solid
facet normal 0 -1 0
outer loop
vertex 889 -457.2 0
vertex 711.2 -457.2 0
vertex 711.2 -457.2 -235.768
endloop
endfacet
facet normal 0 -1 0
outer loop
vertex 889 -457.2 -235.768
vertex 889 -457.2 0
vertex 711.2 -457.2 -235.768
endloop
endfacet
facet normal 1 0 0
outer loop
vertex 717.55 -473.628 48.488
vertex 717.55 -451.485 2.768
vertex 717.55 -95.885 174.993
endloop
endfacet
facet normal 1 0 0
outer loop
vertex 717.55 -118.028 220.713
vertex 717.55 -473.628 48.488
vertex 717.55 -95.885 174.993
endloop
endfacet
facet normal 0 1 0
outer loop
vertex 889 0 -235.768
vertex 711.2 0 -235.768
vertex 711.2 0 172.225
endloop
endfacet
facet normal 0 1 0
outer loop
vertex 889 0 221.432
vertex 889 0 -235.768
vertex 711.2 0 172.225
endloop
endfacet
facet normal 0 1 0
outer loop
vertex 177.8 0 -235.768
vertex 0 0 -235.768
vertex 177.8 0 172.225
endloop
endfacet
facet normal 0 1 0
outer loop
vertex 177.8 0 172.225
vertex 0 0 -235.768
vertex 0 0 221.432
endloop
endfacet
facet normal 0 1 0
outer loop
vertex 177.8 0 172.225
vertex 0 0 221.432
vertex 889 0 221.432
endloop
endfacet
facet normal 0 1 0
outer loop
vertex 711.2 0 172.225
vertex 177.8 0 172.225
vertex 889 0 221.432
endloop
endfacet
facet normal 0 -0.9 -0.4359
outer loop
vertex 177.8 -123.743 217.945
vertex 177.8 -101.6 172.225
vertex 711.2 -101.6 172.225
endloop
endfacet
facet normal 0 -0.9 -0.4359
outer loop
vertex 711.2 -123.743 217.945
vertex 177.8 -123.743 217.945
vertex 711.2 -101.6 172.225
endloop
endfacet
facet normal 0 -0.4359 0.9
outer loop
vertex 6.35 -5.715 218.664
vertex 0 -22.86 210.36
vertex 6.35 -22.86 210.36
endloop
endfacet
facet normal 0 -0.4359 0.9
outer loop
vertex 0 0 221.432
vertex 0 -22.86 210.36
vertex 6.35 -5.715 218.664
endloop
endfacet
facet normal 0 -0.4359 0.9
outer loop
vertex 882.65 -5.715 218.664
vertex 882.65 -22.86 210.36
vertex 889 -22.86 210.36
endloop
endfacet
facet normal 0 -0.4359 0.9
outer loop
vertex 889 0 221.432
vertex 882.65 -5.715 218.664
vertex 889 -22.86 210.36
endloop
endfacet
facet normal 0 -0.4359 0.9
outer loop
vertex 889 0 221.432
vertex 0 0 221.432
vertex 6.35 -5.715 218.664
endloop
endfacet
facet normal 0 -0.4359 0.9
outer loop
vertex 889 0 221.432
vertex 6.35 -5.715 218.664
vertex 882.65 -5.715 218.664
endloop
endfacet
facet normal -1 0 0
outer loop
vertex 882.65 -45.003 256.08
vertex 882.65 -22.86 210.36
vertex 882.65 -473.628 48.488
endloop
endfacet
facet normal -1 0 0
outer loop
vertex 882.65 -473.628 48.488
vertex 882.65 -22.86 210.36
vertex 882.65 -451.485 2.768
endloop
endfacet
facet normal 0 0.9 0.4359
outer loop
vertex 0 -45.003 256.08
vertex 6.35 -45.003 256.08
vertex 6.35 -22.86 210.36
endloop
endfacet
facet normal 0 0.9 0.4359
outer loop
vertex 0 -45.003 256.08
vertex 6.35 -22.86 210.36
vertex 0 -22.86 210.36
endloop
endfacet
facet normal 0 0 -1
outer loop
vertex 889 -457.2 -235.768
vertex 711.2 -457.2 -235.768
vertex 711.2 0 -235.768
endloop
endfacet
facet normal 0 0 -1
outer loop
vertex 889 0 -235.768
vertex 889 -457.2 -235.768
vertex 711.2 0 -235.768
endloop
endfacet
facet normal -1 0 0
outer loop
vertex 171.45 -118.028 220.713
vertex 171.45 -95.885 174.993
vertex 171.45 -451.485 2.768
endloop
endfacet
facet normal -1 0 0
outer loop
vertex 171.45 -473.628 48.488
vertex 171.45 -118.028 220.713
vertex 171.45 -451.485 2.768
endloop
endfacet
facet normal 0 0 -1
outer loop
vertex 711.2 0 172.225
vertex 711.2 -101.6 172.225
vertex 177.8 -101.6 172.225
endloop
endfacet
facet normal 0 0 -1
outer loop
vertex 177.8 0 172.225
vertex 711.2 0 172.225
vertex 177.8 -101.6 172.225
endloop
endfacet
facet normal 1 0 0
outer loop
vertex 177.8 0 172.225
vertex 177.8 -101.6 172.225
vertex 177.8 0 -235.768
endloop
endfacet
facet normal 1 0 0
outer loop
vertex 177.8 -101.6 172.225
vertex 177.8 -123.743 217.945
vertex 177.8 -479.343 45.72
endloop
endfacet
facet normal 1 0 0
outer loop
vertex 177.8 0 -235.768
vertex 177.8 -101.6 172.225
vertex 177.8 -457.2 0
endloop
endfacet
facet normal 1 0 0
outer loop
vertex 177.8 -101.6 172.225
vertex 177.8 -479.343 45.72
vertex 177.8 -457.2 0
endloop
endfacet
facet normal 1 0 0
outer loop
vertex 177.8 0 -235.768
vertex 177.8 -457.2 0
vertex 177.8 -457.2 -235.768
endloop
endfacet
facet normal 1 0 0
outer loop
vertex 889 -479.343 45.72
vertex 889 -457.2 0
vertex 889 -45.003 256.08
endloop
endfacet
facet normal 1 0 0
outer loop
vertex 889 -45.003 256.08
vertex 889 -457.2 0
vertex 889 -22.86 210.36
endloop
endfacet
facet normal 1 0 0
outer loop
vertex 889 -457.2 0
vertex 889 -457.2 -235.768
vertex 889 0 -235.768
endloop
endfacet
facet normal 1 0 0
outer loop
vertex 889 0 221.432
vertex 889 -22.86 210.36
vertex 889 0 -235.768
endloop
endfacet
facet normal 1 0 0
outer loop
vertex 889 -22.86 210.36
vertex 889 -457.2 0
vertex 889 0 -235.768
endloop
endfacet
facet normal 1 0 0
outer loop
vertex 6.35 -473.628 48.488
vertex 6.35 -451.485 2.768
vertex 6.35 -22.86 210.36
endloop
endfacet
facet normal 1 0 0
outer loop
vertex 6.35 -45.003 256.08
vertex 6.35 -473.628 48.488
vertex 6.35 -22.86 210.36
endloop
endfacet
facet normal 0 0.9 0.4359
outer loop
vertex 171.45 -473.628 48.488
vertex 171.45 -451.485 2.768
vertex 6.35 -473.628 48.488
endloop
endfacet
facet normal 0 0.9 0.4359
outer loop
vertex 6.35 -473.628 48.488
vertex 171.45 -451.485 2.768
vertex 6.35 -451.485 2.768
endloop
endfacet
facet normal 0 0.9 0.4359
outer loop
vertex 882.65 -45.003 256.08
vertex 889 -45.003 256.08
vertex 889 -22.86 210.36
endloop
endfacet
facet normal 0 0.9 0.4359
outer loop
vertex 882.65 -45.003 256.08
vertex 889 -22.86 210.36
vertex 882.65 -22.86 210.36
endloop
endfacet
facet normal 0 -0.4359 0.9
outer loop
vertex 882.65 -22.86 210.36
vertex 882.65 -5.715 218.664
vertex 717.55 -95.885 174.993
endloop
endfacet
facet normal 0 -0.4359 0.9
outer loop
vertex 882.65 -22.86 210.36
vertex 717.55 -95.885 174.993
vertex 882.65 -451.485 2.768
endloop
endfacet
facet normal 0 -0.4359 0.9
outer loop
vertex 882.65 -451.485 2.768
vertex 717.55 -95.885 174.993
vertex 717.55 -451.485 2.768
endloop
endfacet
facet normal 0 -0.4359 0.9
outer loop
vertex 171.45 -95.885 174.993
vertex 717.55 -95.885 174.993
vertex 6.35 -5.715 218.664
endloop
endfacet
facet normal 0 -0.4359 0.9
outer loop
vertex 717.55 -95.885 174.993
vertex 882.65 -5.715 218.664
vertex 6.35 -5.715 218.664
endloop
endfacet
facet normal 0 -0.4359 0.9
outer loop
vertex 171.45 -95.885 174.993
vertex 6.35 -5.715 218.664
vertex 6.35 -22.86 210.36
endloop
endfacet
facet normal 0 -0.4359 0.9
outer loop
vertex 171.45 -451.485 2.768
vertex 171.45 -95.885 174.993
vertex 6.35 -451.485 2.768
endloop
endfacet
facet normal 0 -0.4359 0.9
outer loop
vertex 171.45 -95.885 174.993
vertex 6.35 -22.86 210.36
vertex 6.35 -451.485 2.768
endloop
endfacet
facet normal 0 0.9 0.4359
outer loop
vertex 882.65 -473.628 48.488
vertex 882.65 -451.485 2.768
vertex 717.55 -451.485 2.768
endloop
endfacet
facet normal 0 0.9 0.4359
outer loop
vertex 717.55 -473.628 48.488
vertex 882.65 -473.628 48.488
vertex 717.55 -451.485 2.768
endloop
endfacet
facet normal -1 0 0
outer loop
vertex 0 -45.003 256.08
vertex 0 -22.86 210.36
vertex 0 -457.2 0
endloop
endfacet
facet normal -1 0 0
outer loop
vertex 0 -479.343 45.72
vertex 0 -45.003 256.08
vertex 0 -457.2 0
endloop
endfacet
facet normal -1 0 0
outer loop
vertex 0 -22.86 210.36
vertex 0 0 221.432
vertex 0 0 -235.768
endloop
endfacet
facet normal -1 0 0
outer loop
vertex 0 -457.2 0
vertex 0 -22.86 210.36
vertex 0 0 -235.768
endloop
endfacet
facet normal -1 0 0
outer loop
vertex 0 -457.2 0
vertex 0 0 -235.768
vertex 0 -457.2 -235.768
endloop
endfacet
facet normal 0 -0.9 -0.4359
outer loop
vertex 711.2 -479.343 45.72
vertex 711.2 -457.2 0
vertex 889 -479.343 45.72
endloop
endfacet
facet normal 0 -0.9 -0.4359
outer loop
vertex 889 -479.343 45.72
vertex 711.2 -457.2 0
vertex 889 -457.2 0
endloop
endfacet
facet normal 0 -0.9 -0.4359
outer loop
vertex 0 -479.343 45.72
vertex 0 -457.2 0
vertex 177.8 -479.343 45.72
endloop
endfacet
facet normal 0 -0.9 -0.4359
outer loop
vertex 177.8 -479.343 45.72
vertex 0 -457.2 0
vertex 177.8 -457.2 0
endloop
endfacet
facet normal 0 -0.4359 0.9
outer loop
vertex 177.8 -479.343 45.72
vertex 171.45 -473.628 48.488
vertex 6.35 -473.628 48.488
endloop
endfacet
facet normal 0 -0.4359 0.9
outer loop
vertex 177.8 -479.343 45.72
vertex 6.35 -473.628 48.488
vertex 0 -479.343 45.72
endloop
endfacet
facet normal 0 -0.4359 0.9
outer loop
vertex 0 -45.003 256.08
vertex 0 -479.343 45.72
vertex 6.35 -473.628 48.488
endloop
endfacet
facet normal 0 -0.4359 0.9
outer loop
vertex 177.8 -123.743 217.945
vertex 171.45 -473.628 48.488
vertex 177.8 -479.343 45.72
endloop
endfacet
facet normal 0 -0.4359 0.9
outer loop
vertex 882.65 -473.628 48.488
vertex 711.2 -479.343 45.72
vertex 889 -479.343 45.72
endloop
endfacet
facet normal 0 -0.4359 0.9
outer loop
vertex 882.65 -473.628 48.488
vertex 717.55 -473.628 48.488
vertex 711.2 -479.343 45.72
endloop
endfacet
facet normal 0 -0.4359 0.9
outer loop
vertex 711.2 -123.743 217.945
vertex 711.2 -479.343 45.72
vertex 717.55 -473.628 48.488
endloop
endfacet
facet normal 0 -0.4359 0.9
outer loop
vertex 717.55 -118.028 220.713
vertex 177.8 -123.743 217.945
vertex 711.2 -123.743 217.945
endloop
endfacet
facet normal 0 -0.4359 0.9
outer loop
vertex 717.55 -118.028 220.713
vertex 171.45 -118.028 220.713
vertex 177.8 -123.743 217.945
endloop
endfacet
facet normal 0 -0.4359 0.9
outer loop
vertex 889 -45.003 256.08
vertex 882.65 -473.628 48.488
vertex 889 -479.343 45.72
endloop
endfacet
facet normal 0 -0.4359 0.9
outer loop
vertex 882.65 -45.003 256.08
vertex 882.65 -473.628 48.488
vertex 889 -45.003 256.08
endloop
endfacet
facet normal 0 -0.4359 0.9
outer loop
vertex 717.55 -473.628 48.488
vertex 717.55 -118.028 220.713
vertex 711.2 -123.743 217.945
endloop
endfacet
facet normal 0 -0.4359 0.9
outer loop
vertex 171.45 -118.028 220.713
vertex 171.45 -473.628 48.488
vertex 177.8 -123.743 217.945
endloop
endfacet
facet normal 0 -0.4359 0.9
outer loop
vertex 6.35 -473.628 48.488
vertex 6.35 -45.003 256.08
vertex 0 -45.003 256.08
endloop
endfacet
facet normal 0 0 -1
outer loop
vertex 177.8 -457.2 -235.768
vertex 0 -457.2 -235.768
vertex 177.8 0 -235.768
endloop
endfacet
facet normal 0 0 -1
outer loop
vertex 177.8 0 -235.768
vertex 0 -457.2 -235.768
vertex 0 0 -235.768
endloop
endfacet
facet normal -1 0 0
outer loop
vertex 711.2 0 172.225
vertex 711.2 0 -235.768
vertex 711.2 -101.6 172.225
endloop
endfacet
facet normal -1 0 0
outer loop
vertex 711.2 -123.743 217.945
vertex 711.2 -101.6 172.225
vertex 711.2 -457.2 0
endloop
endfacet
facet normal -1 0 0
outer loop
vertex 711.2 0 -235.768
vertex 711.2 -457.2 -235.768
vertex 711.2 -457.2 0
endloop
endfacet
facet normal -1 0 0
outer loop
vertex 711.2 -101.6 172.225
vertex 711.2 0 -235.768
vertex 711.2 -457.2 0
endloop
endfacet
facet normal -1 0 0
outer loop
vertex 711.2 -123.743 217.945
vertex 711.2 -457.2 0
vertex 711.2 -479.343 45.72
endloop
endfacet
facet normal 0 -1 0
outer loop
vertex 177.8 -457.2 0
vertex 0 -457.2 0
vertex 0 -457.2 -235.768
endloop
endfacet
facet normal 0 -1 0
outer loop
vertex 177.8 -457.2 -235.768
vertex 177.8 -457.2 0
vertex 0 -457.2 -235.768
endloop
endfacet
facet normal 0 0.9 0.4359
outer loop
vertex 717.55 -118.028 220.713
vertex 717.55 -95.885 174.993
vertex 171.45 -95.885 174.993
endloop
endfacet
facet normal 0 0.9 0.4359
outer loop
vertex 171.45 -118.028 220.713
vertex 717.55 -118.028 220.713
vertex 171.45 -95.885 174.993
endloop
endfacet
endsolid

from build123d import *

# Parameters (mm, degrees)
F1_DEPTH = 889
F2_W     = 533.4
F2_H     = 235.7679336681
F2_H_2   = 224.7003448227
F3_DEPTH = 355.6
F5_DEPTH = 50.8
F6_DEPTH = 25.4
F7_DEPTH = 101.601


with BuildPart() as f1:
    # F0 (on Right) → F1 (new body)
    with BuildSketch(Plane.YZ):
        Polygon((0, -235.7679336681), (0, 221.4320663319), (-457.2, 0), (-457.2, -235.7679336681), align=None)
    extrude(amount=F1_DEPTH)

    # F2 (on face) → F3 (cut)
    with BuildSketch(Plane.XZ.offset(457.2)):
        with Locations((444.5, -117.8839668341)):
            Rectangle(F2_W, F2_H)
        with Locations((444.5, 112.3501724113)):
            Rectangle(F2_W, F2_H_2)
    extrude(amount=-F3_DEPTH, mode=Mode.SUBTRACT)

    # F4 (on face) → F5 (join)
    with BuildSketch(Plane(origin=(0, -86.868, 179.3599737288), x_dir=(1, 0, 0), z_dir=(0, -0.4358898944, 0.9))):
        Polygon((889, 96.52), (0, 96.52), (0, -411.48), (177.8, -411.48), (177.8, -16.3688888889), (711.2, -16.3688888889), (711.2, -411.48), (889, -411.48), align=None)
        Polygon((6.35, -405.13), (6.35, 90.17), (882.65, 90.17), (882.65, -405.13), (717.55, -405.13), (717.55, -10.0188888889), (171.45, -10.0188888889), (171.45, -405.13), align=None, mode=Mode.SUBTRACT)
    extrude(amount=F5_DEPTH)

    # F6 (cut): a face of the model
    f6_faces = [f1.faces().sort_by_distance(p)[0] for p in [
        (444.5, -11.0716033166, 244.2920663319),
    ]]
    extrude(f6_faces, amount=-F6_DEPTH, mode=Mode.SUBTRACT)

    # F7 (cut, through all): a face of the model
    f7_faces = [f1.faces().sort_by_distance(p)[0] for p in [
        (444.5, -101.6, -31.7714965939),
    ]]
    extrude(f7_faces, amount=-F7_DEPTH, mode=Mode.SUBTRACT)


solid = f1.part
